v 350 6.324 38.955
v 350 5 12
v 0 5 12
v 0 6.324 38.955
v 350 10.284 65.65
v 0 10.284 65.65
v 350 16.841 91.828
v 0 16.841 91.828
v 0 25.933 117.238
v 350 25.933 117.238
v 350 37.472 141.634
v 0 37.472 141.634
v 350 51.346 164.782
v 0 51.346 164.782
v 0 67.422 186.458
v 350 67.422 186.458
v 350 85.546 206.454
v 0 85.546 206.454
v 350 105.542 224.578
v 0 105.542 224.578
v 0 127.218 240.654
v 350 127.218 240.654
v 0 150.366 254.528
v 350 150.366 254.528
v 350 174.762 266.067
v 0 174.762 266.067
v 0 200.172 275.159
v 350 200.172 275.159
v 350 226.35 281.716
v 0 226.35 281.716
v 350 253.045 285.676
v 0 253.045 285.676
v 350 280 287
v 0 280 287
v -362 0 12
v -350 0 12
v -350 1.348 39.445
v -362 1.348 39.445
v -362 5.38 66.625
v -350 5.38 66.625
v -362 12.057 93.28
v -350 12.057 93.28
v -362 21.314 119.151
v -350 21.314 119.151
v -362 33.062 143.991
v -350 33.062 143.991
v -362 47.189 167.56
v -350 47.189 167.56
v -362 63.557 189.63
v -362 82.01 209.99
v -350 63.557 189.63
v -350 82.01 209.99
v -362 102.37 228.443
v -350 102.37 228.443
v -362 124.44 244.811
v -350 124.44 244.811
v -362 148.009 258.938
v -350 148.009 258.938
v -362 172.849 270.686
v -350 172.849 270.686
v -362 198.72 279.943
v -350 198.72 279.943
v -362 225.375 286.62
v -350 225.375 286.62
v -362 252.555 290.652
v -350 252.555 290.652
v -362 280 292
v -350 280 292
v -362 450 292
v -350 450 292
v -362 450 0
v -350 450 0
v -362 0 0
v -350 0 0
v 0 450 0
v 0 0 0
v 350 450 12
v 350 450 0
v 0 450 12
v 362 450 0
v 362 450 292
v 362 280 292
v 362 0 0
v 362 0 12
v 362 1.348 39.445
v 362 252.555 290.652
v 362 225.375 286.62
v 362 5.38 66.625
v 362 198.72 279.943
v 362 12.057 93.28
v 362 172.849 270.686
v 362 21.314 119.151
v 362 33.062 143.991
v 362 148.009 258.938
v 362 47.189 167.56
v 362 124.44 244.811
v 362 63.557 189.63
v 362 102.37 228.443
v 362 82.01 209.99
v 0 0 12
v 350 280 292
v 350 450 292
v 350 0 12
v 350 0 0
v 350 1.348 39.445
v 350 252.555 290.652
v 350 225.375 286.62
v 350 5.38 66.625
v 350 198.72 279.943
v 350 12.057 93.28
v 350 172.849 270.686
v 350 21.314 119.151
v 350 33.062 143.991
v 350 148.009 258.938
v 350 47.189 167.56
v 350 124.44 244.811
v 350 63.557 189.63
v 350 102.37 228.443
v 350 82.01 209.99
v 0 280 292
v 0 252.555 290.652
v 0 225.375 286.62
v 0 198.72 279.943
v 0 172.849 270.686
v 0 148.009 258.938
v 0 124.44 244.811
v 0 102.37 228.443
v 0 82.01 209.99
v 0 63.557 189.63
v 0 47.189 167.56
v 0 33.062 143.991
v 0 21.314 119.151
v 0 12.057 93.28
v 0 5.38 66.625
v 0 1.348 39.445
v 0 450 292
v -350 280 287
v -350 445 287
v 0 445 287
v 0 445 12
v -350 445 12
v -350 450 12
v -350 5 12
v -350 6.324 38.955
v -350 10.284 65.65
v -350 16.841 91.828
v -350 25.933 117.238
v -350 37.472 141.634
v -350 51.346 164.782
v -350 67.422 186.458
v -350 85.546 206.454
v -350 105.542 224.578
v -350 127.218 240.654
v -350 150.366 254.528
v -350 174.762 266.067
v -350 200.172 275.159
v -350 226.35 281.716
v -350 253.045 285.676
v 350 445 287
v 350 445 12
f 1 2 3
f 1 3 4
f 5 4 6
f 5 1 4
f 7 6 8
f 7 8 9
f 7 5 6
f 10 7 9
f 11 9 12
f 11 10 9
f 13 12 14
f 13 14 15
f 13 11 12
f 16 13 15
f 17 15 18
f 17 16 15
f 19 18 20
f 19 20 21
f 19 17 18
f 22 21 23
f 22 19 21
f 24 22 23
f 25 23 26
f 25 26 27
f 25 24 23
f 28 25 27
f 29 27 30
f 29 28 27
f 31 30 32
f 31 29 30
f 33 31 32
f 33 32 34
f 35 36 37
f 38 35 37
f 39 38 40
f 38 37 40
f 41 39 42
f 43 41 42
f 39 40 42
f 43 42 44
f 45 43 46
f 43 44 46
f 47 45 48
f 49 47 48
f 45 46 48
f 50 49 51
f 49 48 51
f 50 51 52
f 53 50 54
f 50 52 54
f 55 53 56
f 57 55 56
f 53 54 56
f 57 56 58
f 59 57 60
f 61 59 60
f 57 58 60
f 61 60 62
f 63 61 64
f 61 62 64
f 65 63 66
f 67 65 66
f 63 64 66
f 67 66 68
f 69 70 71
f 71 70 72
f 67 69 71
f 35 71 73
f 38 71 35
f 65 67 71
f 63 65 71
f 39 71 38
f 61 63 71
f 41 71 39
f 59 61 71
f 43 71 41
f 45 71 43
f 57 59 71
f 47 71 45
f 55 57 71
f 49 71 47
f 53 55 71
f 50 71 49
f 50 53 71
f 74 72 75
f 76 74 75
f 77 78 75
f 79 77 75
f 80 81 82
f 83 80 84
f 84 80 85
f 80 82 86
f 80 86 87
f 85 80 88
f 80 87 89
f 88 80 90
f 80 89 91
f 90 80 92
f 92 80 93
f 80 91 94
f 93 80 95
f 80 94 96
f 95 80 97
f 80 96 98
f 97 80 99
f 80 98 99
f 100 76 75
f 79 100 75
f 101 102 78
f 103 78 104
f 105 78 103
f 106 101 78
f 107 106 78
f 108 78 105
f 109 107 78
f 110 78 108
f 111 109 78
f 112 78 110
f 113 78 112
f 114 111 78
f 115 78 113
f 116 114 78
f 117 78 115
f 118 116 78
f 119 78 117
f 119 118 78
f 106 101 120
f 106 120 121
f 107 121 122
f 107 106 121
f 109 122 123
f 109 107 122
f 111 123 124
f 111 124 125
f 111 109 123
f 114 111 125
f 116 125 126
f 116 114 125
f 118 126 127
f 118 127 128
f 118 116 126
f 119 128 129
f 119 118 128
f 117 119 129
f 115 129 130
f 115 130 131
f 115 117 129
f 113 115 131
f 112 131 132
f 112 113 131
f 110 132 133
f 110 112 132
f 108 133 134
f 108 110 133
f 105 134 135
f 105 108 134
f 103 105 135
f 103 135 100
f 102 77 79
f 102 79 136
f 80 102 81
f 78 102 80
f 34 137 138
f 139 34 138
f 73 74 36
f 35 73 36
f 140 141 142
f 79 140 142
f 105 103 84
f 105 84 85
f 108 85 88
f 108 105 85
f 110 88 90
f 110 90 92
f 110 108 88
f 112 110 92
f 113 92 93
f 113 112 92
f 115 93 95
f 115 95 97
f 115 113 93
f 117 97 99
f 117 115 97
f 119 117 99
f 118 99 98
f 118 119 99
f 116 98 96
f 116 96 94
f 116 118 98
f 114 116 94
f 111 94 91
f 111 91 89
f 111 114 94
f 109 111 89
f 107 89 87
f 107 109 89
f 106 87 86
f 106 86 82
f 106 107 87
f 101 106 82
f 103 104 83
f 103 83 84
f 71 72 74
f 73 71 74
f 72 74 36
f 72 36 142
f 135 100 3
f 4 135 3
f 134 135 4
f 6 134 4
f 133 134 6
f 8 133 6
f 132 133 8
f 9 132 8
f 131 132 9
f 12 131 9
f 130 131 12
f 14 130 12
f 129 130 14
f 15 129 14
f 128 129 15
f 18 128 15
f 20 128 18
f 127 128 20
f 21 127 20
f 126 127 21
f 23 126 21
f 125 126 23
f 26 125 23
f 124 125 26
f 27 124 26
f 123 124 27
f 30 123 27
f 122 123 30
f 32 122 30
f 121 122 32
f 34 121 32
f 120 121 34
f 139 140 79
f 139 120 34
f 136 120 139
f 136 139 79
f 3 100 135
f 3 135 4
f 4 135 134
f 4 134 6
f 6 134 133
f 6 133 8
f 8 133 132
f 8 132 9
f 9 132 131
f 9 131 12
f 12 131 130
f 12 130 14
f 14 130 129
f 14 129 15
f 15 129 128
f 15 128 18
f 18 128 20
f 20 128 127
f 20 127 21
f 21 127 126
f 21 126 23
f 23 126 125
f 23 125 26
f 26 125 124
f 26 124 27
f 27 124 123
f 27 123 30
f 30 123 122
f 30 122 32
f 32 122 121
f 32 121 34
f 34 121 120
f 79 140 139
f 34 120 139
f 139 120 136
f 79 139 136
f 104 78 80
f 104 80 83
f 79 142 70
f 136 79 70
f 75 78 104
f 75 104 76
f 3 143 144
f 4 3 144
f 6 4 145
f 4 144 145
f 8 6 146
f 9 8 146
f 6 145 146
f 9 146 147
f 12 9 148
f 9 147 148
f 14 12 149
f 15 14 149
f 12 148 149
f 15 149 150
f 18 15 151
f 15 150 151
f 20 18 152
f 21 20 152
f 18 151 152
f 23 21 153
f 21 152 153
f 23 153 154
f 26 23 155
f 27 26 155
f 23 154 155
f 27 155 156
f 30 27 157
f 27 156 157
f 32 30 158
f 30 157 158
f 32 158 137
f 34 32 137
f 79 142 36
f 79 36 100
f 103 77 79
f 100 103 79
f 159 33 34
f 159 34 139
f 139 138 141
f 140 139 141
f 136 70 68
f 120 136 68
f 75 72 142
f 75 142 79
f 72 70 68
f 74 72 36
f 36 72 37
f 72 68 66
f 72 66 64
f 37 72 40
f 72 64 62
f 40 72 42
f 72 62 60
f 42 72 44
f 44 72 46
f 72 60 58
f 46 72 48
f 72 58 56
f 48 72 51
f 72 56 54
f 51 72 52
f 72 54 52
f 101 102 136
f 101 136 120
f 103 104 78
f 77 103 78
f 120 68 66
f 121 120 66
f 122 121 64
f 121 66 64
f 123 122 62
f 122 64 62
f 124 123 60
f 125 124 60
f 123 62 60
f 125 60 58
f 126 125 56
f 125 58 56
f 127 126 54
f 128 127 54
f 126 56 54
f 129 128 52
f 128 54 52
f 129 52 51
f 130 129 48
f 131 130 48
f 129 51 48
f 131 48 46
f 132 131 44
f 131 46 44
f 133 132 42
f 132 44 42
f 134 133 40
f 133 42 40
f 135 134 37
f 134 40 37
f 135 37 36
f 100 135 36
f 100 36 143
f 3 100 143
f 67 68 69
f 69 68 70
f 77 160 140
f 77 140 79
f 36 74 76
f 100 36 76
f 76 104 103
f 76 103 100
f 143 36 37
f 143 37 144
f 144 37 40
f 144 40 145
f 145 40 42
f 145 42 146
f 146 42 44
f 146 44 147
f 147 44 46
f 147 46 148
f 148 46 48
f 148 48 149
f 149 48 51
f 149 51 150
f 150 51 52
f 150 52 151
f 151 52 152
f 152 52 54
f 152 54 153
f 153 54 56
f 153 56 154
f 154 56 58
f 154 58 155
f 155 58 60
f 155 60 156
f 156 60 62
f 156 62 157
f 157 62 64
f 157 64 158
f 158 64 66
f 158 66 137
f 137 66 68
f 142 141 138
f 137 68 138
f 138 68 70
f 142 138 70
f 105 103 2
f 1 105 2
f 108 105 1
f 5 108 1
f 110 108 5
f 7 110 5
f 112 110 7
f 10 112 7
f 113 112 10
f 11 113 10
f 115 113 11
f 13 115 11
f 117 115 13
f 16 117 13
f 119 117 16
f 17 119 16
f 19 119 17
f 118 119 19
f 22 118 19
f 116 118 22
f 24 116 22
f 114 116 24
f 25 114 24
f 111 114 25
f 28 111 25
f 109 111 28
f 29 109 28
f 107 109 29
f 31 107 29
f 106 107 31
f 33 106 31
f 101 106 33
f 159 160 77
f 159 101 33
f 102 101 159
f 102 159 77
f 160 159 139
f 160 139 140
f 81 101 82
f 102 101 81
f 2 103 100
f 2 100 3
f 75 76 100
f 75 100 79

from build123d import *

# Parameters (mm, degrees)
F2_W     = 350
F2_H     = 450
F3_DEPTH = 12
F5_DEPTH = 12
F7_DEPTH = 350


with BuildPart() as f3:
    # F2 (on Top) → F3 (new body)
    with BuildSketch(Plane.XY):
        with Locations((-175, 225)):
            Rectangle(F2_W, F2_H)
    extrude(amount=F3_DEPTH)


with BuildPart() as f5:
    # F4 (on face) → F5 (new body)
    with BuildSketch(Plane(origin=(-350, 0, 0), x_dir=(0, -1, 0), z_dir=(-1, 0, 0))):
        with BuildLine():
            Line((-450, 292), (-450, 0))
            Line((-450, 0), (0, 0))
            Line((0, 0), (0, 12))
            ThreePointArc((0, 12), (-82.0101012678, 209.9898987322), (-280, 292))
            Line((-280, 292), (-450, 292))
        make_face()
    extrude(amount=F5_DEPTH)


with BuildPart() as f7:
    # F6 (on face) → F7 (new body)
    with BuildSketch(Plane.YZ.offset(-350)):
        with BuildLine():
            Line((280, 287), (445, 287))
            Line((445, 287), (445, 12))
            Line((445, 12), (450, 12))
            Line((450, 12), (450, 292))
            Line((450, 292), (280, 292))
            ThreePointArc((280, 292), (82.0101012678, 209.9898987322), (0, 12))
            Line((0, 12), (5, 12))
            ThreePointArc((5, 12), (85.5456351737, 206.4543648263), (280, 287))
        make_face()
    extrude(amount=F7_DEPTH)


with BuildPart() as f8_1:
    # F8: instance of F3
    add(f3.part.mirror(Plane(origin=(0, 261.2738011127, 195.8989357259), x_dir=(0, 1, 0), z_dir=(1, 0, 0))))


with BuildPart() as f8_2:
    # F8: instance of F5
    add(f5.part.mirror(Plane(origin=(0, 261.2738011127, 195.8989357259), x_dir=(0, 1, 0), z_dir=(1, 0, 0))))


with BuildPart() as f8_3:
    # F8: instance of F7
    add(f7.part.mirror(Plane(origin=(0, 261.2738011127, 195.8989357259), x_dir=(0, 1, 0), z_dir=(1, 0, 0))))


solid = Compound([f3.part, f5.part, f7.part, f8_1.part, f8_2.part, f8_3.part])
